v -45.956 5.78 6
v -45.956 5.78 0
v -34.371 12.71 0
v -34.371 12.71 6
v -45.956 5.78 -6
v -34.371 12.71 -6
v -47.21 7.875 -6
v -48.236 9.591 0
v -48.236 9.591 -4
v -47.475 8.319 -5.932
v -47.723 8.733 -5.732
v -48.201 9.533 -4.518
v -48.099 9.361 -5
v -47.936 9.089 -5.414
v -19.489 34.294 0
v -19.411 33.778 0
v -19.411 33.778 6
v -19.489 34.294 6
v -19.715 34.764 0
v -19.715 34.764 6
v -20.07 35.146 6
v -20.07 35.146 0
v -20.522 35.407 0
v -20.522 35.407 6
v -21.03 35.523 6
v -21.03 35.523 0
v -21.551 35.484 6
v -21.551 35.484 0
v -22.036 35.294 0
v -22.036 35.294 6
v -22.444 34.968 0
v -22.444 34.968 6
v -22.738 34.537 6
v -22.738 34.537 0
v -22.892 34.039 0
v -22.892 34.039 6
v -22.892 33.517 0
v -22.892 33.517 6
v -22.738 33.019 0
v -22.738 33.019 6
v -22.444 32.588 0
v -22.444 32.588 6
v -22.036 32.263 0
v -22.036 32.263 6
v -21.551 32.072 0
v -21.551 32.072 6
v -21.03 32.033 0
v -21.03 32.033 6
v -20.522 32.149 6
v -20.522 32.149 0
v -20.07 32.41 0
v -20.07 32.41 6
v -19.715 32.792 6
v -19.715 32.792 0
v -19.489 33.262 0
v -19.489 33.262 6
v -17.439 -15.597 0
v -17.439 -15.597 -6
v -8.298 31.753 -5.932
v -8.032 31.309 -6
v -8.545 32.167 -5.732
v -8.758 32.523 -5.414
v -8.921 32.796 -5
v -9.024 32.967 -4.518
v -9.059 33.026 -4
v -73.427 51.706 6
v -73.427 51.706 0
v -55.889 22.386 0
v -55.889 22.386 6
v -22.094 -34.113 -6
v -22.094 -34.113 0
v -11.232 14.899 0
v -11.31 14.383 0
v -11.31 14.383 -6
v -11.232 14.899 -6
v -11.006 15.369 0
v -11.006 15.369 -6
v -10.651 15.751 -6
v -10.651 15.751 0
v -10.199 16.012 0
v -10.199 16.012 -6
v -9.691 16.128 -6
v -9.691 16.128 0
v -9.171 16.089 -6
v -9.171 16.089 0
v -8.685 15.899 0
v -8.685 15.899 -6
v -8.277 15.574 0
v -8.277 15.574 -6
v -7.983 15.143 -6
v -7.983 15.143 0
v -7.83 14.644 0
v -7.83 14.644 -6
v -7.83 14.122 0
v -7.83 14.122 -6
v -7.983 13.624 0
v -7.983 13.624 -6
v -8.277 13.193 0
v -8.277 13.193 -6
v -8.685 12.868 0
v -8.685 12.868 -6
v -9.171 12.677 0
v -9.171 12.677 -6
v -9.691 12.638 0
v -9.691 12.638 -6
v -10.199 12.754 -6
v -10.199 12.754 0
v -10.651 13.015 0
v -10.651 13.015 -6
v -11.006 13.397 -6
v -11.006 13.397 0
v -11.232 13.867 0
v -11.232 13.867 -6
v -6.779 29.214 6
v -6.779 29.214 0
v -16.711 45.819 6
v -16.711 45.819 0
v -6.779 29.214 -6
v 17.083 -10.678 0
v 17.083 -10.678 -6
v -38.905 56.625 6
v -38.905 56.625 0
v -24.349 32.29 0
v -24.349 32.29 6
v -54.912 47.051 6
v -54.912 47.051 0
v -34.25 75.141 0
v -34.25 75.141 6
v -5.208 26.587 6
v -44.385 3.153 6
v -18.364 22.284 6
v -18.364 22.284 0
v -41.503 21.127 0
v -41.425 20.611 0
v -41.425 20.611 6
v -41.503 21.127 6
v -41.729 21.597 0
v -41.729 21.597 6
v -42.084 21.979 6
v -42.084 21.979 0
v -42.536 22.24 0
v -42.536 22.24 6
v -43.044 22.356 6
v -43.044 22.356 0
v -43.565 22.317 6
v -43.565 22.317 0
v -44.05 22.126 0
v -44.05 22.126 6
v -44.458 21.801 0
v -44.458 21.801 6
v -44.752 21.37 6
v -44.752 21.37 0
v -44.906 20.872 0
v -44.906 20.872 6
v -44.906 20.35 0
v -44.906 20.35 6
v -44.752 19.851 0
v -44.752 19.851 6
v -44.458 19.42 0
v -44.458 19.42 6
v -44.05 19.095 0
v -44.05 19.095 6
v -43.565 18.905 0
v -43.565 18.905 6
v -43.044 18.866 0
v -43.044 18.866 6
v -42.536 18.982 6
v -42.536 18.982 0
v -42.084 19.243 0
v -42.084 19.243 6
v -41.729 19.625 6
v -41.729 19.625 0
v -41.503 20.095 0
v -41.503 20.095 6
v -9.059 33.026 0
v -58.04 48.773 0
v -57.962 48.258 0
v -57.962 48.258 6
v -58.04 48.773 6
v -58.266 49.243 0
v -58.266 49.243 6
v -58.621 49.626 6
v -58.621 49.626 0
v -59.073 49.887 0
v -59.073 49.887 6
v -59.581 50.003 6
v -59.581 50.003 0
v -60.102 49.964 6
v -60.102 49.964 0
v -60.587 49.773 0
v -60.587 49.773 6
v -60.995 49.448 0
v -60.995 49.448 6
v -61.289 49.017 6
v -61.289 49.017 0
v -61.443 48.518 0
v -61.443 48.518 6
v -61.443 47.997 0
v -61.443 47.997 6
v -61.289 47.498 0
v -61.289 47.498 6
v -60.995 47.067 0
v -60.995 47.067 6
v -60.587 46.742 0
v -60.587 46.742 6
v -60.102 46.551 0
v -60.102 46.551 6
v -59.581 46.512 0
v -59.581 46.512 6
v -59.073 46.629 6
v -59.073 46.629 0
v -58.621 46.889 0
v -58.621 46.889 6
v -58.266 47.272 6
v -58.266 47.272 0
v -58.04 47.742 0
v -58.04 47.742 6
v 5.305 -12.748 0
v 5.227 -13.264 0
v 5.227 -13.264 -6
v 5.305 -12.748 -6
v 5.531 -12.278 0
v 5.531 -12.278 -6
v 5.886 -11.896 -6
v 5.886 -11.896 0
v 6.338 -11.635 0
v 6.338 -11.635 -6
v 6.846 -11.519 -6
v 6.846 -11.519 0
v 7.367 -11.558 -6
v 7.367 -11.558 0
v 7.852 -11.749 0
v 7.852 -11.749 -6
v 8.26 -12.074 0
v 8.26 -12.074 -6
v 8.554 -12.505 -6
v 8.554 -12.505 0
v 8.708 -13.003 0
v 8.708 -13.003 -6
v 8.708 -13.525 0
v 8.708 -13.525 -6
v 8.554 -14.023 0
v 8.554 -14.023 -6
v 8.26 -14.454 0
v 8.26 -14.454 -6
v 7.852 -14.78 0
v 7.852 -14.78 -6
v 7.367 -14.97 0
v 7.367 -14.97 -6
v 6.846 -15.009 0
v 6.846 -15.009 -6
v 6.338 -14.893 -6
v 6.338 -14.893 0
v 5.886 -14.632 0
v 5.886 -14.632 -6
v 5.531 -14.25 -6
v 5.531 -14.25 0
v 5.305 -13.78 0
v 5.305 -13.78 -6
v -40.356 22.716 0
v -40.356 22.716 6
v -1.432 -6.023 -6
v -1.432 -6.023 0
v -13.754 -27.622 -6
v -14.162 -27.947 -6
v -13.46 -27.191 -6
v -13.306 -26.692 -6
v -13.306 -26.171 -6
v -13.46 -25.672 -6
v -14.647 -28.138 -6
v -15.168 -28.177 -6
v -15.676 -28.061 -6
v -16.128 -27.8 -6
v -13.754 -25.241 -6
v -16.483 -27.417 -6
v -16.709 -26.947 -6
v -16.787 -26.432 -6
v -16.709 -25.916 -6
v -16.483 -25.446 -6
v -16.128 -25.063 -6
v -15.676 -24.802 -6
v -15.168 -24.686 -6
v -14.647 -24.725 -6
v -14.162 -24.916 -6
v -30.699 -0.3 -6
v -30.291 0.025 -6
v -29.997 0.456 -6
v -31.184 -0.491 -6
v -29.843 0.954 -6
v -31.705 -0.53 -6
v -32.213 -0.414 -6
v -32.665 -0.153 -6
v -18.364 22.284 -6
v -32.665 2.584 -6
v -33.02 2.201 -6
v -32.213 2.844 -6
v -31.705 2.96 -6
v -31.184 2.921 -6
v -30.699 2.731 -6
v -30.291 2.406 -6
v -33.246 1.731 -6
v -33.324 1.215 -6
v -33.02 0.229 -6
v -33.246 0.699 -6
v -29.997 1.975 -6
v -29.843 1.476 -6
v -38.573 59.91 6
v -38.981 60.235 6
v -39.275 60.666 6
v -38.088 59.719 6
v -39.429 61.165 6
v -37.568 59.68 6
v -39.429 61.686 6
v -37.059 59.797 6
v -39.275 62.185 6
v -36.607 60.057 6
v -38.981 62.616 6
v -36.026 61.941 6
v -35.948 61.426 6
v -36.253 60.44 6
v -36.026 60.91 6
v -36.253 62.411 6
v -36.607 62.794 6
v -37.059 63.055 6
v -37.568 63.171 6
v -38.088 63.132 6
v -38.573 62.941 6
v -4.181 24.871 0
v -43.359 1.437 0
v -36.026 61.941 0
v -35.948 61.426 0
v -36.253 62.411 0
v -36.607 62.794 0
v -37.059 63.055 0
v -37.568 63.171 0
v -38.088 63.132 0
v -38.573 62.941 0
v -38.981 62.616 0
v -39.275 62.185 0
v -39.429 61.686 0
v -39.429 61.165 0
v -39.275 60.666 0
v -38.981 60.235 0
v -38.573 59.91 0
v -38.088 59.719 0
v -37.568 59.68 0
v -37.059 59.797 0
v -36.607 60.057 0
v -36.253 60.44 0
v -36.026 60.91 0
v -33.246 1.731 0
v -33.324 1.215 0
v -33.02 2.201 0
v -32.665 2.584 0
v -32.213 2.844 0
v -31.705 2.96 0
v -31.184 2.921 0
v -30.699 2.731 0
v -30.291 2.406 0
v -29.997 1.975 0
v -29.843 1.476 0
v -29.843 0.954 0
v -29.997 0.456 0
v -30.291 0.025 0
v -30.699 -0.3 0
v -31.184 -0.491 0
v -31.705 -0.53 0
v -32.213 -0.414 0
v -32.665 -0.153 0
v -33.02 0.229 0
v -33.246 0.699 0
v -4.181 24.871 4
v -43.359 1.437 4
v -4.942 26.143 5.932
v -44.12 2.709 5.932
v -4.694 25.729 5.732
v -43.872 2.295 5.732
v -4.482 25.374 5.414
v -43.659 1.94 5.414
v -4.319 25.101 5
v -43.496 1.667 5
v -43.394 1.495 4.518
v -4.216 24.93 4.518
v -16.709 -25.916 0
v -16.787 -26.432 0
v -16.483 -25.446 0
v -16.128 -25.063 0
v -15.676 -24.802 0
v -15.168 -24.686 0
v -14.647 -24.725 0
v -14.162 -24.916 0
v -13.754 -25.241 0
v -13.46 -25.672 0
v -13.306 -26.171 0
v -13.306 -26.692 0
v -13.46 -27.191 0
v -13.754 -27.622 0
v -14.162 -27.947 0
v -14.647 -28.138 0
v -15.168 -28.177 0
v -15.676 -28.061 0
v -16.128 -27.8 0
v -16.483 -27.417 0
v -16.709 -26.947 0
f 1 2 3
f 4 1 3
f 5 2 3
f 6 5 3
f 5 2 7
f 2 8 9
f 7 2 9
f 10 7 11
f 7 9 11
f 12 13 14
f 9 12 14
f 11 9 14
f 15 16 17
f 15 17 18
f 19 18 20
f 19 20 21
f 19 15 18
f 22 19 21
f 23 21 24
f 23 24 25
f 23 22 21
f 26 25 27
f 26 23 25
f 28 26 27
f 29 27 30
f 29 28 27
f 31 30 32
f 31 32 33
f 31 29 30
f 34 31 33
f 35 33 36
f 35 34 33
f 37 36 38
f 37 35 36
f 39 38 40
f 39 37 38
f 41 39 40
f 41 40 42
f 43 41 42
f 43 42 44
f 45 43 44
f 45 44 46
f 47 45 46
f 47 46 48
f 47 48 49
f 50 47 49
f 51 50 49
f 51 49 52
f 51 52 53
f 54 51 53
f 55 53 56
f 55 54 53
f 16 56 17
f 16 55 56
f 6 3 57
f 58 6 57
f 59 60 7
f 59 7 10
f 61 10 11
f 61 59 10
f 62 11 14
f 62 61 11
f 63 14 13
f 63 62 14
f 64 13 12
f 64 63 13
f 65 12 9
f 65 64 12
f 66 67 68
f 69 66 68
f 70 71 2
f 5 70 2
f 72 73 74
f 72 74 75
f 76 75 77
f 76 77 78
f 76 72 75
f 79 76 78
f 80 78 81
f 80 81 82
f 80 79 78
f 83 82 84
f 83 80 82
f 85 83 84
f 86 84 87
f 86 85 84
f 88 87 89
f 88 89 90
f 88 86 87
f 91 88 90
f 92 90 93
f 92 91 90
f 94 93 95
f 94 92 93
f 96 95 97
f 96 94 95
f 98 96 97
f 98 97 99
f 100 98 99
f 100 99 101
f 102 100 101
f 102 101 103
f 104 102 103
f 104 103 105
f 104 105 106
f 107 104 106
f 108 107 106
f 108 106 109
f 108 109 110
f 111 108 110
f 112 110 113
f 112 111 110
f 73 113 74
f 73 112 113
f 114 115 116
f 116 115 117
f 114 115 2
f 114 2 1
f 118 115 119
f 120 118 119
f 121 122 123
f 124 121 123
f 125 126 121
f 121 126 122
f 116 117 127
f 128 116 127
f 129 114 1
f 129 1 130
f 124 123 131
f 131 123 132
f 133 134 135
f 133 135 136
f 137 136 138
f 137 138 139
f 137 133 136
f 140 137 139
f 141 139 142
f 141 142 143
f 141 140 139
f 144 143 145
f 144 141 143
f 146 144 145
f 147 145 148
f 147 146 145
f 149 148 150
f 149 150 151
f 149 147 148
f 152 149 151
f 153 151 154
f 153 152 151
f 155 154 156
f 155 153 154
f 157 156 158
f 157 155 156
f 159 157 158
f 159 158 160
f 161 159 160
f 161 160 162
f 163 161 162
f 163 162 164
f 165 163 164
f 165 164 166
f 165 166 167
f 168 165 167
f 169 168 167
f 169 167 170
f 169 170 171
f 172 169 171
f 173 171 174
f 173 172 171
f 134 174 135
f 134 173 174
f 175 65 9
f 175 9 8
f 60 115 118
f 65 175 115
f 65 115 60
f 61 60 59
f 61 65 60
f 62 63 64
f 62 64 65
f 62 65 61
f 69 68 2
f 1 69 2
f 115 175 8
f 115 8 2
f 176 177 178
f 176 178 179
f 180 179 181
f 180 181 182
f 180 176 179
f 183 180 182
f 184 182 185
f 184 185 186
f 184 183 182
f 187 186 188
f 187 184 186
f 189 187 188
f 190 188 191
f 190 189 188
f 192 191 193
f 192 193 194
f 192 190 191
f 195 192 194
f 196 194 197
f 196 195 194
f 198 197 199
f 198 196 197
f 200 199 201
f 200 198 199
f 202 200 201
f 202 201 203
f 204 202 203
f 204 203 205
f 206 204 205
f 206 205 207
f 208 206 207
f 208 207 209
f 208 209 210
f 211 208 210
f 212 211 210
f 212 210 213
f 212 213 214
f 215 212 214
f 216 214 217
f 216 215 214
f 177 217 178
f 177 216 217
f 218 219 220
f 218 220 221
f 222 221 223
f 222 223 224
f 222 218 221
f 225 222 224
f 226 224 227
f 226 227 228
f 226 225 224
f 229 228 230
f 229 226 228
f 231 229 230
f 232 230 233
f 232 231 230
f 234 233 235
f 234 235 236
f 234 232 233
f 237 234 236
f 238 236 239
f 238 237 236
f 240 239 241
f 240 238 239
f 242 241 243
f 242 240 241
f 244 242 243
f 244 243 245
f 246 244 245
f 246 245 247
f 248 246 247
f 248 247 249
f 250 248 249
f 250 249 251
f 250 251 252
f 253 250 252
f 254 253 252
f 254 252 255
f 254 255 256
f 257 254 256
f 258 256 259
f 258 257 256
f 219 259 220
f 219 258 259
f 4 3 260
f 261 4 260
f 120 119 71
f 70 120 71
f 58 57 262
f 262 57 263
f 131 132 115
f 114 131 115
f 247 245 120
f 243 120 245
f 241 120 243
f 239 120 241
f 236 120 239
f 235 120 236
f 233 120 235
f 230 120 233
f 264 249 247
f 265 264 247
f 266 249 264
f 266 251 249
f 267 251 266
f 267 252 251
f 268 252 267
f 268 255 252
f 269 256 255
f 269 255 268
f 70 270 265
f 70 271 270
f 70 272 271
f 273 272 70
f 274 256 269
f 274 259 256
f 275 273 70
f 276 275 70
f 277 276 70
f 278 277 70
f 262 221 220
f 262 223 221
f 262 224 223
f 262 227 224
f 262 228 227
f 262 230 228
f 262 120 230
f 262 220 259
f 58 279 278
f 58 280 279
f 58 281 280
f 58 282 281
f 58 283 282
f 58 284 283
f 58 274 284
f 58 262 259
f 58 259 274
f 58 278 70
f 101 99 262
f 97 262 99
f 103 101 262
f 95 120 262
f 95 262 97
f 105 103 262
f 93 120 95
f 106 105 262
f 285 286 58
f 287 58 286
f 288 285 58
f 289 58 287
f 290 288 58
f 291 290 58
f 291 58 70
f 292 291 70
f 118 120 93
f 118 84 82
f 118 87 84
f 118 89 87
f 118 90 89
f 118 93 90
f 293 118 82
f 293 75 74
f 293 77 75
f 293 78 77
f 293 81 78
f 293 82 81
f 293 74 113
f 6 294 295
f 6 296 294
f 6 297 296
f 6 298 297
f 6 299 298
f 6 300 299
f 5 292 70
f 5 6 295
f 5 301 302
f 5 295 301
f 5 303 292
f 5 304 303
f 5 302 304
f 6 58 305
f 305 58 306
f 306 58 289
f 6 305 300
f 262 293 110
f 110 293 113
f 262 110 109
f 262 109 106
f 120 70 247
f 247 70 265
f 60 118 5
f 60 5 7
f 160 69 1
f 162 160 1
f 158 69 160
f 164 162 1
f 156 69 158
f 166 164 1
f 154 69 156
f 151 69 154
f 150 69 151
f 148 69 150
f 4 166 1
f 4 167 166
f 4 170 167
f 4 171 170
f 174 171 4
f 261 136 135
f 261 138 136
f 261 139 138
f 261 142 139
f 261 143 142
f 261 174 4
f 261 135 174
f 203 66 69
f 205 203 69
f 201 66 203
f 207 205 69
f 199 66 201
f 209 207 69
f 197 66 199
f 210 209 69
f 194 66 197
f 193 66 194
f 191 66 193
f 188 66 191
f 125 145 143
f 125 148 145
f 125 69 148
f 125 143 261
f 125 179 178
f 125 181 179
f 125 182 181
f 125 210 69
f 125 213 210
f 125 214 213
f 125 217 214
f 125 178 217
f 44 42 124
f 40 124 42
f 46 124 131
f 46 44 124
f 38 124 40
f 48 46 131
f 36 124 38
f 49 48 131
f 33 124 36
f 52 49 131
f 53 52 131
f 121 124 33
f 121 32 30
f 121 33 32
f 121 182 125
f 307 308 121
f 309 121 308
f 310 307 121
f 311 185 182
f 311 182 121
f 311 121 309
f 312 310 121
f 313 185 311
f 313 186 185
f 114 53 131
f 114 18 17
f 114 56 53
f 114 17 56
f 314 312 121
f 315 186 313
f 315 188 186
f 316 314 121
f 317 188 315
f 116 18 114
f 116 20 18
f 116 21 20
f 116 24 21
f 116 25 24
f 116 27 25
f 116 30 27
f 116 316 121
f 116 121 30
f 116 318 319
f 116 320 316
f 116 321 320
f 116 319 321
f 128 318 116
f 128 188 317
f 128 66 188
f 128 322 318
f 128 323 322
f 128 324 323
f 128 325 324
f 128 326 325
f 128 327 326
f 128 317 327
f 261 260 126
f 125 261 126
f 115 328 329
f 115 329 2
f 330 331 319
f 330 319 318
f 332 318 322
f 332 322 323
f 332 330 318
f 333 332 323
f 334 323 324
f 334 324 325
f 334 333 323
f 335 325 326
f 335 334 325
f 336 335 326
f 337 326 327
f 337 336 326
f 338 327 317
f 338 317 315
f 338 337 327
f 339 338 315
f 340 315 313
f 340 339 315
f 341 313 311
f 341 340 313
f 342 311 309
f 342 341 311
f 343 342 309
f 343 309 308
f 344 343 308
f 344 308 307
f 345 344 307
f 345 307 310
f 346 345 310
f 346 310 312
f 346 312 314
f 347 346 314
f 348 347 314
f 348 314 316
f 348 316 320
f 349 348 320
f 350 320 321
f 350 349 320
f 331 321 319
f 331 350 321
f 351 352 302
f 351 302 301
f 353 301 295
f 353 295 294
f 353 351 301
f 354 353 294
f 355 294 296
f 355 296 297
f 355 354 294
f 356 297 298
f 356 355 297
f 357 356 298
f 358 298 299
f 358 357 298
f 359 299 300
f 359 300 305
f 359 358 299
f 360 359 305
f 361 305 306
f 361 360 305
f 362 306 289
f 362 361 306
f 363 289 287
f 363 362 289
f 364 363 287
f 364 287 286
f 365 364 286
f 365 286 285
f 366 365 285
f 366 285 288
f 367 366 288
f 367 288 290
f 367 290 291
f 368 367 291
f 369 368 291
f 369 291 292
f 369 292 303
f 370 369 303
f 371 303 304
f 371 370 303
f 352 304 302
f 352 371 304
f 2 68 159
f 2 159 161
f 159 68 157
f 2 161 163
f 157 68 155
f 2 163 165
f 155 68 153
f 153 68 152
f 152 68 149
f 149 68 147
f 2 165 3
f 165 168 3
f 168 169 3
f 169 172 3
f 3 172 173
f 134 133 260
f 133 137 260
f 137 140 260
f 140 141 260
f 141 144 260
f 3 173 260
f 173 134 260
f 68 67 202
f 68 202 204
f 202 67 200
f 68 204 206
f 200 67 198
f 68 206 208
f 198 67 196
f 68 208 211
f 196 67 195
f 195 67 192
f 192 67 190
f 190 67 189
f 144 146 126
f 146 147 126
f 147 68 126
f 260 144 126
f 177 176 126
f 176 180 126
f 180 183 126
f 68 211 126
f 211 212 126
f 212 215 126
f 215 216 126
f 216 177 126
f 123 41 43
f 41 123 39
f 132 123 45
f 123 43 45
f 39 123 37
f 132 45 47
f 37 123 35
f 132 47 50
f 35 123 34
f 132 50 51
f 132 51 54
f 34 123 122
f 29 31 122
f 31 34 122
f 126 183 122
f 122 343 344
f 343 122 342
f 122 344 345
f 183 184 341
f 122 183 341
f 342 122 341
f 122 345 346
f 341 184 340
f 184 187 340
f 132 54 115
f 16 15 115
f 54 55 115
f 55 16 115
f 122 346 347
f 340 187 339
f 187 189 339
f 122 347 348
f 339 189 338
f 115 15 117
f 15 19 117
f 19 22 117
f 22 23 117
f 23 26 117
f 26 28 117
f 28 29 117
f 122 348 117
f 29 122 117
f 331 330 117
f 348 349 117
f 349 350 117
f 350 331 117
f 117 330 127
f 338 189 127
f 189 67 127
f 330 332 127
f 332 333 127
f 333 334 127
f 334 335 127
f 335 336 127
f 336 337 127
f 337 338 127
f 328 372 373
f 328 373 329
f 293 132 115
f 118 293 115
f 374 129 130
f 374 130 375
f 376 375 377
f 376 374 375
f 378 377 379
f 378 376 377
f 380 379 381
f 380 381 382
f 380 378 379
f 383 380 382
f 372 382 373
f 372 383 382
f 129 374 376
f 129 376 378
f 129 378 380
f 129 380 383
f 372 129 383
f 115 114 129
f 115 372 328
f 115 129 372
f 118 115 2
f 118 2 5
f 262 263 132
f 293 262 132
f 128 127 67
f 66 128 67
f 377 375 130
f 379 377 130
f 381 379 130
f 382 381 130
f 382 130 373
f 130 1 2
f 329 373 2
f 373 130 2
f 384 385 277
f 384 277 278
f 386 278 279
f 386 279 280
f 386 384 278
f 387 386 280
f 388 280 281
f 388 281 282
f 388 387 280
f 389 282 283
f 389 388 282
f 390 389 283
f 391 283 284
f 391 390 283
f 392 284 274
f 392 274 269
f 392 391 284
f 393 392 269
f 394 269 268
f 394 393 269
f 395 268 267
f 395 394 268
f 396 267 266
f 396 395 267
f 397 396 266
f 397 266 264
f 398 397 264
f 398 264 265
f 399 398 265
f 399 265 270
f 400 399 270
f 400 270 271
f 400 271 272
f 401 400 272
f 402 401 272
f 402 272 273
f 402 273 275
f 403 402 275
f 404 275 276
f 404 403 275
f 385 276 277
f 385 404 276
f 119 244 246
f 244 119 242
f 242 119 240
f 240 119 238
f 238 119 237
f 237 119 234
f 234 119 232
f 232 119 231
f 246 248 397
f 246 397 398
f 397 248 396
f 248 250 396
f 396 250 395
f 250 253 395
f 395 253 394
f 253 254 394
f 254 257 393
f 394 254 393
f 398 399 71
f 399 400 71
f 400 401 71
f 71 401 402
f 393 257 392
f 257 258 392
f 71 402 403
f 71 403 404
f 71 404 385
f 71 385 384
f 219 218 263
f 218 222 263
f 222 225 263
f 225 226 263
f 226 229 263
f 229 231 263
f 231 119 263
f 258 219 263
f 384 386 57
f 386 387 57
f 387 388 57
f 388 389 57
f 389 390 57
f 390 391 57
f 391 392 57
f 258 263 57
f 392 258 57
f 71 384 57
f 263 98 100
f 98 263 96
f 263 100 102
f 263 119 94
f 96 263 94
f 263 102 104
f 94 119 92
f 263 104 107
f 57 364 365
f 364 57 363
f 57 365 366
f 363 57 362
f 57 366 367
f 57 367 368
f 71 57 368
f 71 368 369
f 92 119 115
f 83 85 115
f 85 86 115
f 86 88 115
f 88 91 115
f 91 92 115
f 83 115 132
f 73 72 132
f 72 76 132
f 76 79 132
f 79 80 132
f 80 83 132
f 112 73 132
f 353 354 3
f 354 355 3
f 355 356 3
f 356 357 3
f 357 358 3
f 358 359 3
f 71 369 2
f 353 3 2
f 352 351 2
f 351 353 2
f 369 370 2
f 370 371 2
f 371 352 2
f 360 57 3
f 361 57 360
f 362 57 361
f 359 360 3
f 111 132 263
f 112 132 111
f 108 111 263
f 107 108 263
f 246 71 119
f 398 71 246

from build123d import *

# Parameters (mm, degrees)
SKETCH_2_R         = 1.75
EXTRUDE_1_DEPTH    = 6
SKETCH_3_R         = 1.75
EXTRUDE_2_DEPTH    = 6
EXTRUDE_17_DEPTH   = 45.651510747
EXTRUDE_17_2_DEPTH = 45.651510747


with BuildPart() as part:
    # 草图2 → 凸台-拉伸1 (new body)
    # profile 1 of 3: a face of its own
    with BuildSketch(Plane.XY):
        with BuildLine():
            Line((-73.427324865, 51.706126211), (-55.889337921, 22.385784607))
            ThreePointArc((-55.889337921, 22.385784607), (-51.962002674, 21.977062419), (-48.013570238, 22.007016762))
            ThreePointArc((-48.013570238, 22.007016762), (-46.613378868, 21.552890348), (-45.90320467, 20.263541953))
            ThreePointArc((-45.90320467, 20.263541953), (-42.655905931, 17.91025531), (-40.513003789, 21.300075002))
            ThreePointArc((-40.513003789, 21.300075002), (-40.566074024, 22.008719301), (-40.368008135, 22.691187687))
            ThreePointArc((-40.368008135, 22.691187687), (-40.361958472, 22.703470869), (-40.355993042, 22.71579518))
            Line((-40.355993042, 22.71579518), (-54.911886597, 47.050616088))
            Line((-54.911886597, 47.050616088), (-38.905429945, 56.625176062))
            Line((-38.905429945, 56.625176062), (-24.34928893, 32.289941443))
            ThreePointArc((-24.34928893, 32.289941443), (-24.335603169, 32.289367496), (-24.321913798, 32.288887294))
            ThreePointArc((-24.321913798, 32.288887294), (-23.626933575, 32.140579674), (-23.027680881, 31.758625659))
            ThreePointArc((-23.027680881, 31.758625659), (-19.027440456, 32.043222354), (-19.564814907, 36.017407483))
            ThreePointArc((-19.564814907, 36.017407483), (-20.364881109, 37.252986699), (-20.102685981, 38.701439544))
            ThreePointArc((-20.102685981, 38.701439544), (-18.20870194, 42.16593888), (-16.711167613, 45.819337591))
            Line((-16.711167613, 45.819337591), (-34.249858882, 75.140856698))
            Line((-34.249858882, 75.140856698), (-73.427324865, 51.706126211))
        make_face()
        with Locations((-43.175214984, 20.610777132)):
            Circle(SKETCH_2_R, mode=Mode.SUBTRACT)
        with Locations((-59.712185407, 48.257600194)):
            Circle(SKETCH_2_R, mode=Mode.SUBTRACT)
        with Locations((-37.69843004, 61.425537708)):
            Circle(SKETCH_2_R, mode=Mode.SUBTRACT)
        with Locations((-21.161114888, 33.778138323)):
            Circle(SKETCH_2_R, mode=Mode.SUBTRACT)
    # profile 2 of 3: a face of its own
    with BuildSketch(Plane.XY):
        with BuildLine():
            Line((-18.364250903, 22.284040537), (-6.778655524, 29.213974138))
            Line((-6.778655524, 29.213974138), (-16.711167613, 45.819337591))
            ThreePointArc((-16.711167613, 45.819337591), (-18.20870194, 42.16593888), (-20.102685981, 38.701439544))
            ThreePointArc((-20.102685981, 38.701439544), (-20.364881109, 37.252986699), (-19.564814907, 36.017407483))
            ThreePointArc((-19.564814907, 36.017407483), (-19.027440456, 32.043222354), (-23.027680881, 31.758625659))
            ThreePointArc((-23.027680881, 31.758625659), (-23.626933575, 32.140579674), (-24.321913798, 32.288887294))
            ThreePointArc((-24.321913798, 32.288887294), (-24.335603169, 32.289367496), (-24.34928893, 32.289941443))
            Line((-24.34928893, 32.289941443), (-18.364250903, 22.284040537))
        make_face()
    # profile 3 of 3: a face of its own
    with BuildSketch(Plane.XY):
        with BuildLine():
            Line((-55.889337921, 22.385784607), (-45.956428261, 5.779756487))
            Line((-45.956428261, 5.779756487), (-34.370832882, 12.709690089))
            Line((-34.370832882, 12.709690089), (-40.355993042, 22.71579518))
            ThreePointArc((-40.355993042, 22.71579518), (-40.361958472, 22.703470869), (-40.368008135, 22.691187687))
            ThreePointArc((-40.368008135, 22.691187687), (-40.566074024, 22.008719301), (-40.513003789, 21.300075002))
            ThreePointArc((-40.513003789, 21.300075002), (-42.655905931, 17.91025531), (-45.90320467, 20.263541953))
            ThreePointArc((-45.90320467, 20.263541953), (-46.613378868, 21.552890348), (-48.013570238, 22.007016762))
            ThreePointArc((-48.013570238, 22.007016762), (-51.962002674, 21.977062419), (-55.889337921, 22.385784607))
        make_face()
    extrude(amount=EXTRUDE_1_DEPTH)


with BuildPart() as body_2:
    # 草图3 → 凸台-拉伸2 (new body)
    with BuildSketch(Plane(origin=(0, 0, 0), x_dir=(-1, 0, 0), z_dir=(0, 0, -1))):
        Polygon((45.956428261, 5.779756487), (34.370832882, 12.709690089), (17.438912308, -15.59741818), (1.432455657, -6.022858206), (18.364250903, 22.284040537), (6.778655524, 29.213974138), (-17.082982611, -10.678368329), (22.094483372, -34.113098816), align=None)
        with Locations((-6.977273986, -13.26415773)):
            Circle(SKETCH_3_R, mode=Mode.SUBTRACT)
        with Locations((15.036826109, -26.431518921)):
            Circle(SKETCH_3_R, mode=Mode.SUBTRACT)
        with Locations((9.560041165, 14.383241655)):
            Circle(SKETCH_3_R, mode=Mode.SUBTRACT)
        with Locations((31.573796532, 1.215304141)):
            Circle(SKETCH_3_R, mode=Mode.SUBTRACT)
    extrude(amount=EXTRUDE_2_DEPTH)


with BuildPart() as body_3:
    # 草图4 → 凸台-拉伸17 (new body)
    with BuildSketch(Plane(origin=(7.877323837, 4.711827866, 0), x_dir=(0, 0, -1), z_dir=(0.8581922502720695, 0.5133284149284565, 0))):
        with BuildLine():
            Line((0, 32.992326526), (0, 28.550882701))
            Line((0, 28.550882701), (6, 28.550882701))
            Line((6, 28.550882701), (6, 30.992326526))
            ThreePointArc((6, 30.992326526), (5.414213562, 32.406540088), (4, 32.992326526))
            Line((4, 32.992326526), (0, 32.992326526))
        make_face()
    extrude(amount=-EXTRUDE_17_DEPTH)


with BuildPart() as body_4:
    # 草图4 → Extrude 17 2 (new body)
    with BuildSketch(Plane(origin=(7.877323837, 4.711827866, 0), x_dir=(0, 0, -1), z_dir=(0.8581922502720695, 0.5133284149284565, 0))):
        with BuildLine():
            Line((0, 23.490400466), (0, 28.550882701))
            Line((0, 28.550882701), (-6, 28.550882701))
            Line((-6, 28.550882701), (-6, 25.490400466))
            ThreePointArc((-6, 25.490400466), (-5.414213562, 24.076186903), (-4, 23.490400466))
            Line((-4, 23.490400466), (0, 23.490400466))
        make_face()
    extrude(amount=-EXTRUDE_17_2_DEPTH)


solid = Compound([part.part, body_2.part, body_3.part, body_4.part])
